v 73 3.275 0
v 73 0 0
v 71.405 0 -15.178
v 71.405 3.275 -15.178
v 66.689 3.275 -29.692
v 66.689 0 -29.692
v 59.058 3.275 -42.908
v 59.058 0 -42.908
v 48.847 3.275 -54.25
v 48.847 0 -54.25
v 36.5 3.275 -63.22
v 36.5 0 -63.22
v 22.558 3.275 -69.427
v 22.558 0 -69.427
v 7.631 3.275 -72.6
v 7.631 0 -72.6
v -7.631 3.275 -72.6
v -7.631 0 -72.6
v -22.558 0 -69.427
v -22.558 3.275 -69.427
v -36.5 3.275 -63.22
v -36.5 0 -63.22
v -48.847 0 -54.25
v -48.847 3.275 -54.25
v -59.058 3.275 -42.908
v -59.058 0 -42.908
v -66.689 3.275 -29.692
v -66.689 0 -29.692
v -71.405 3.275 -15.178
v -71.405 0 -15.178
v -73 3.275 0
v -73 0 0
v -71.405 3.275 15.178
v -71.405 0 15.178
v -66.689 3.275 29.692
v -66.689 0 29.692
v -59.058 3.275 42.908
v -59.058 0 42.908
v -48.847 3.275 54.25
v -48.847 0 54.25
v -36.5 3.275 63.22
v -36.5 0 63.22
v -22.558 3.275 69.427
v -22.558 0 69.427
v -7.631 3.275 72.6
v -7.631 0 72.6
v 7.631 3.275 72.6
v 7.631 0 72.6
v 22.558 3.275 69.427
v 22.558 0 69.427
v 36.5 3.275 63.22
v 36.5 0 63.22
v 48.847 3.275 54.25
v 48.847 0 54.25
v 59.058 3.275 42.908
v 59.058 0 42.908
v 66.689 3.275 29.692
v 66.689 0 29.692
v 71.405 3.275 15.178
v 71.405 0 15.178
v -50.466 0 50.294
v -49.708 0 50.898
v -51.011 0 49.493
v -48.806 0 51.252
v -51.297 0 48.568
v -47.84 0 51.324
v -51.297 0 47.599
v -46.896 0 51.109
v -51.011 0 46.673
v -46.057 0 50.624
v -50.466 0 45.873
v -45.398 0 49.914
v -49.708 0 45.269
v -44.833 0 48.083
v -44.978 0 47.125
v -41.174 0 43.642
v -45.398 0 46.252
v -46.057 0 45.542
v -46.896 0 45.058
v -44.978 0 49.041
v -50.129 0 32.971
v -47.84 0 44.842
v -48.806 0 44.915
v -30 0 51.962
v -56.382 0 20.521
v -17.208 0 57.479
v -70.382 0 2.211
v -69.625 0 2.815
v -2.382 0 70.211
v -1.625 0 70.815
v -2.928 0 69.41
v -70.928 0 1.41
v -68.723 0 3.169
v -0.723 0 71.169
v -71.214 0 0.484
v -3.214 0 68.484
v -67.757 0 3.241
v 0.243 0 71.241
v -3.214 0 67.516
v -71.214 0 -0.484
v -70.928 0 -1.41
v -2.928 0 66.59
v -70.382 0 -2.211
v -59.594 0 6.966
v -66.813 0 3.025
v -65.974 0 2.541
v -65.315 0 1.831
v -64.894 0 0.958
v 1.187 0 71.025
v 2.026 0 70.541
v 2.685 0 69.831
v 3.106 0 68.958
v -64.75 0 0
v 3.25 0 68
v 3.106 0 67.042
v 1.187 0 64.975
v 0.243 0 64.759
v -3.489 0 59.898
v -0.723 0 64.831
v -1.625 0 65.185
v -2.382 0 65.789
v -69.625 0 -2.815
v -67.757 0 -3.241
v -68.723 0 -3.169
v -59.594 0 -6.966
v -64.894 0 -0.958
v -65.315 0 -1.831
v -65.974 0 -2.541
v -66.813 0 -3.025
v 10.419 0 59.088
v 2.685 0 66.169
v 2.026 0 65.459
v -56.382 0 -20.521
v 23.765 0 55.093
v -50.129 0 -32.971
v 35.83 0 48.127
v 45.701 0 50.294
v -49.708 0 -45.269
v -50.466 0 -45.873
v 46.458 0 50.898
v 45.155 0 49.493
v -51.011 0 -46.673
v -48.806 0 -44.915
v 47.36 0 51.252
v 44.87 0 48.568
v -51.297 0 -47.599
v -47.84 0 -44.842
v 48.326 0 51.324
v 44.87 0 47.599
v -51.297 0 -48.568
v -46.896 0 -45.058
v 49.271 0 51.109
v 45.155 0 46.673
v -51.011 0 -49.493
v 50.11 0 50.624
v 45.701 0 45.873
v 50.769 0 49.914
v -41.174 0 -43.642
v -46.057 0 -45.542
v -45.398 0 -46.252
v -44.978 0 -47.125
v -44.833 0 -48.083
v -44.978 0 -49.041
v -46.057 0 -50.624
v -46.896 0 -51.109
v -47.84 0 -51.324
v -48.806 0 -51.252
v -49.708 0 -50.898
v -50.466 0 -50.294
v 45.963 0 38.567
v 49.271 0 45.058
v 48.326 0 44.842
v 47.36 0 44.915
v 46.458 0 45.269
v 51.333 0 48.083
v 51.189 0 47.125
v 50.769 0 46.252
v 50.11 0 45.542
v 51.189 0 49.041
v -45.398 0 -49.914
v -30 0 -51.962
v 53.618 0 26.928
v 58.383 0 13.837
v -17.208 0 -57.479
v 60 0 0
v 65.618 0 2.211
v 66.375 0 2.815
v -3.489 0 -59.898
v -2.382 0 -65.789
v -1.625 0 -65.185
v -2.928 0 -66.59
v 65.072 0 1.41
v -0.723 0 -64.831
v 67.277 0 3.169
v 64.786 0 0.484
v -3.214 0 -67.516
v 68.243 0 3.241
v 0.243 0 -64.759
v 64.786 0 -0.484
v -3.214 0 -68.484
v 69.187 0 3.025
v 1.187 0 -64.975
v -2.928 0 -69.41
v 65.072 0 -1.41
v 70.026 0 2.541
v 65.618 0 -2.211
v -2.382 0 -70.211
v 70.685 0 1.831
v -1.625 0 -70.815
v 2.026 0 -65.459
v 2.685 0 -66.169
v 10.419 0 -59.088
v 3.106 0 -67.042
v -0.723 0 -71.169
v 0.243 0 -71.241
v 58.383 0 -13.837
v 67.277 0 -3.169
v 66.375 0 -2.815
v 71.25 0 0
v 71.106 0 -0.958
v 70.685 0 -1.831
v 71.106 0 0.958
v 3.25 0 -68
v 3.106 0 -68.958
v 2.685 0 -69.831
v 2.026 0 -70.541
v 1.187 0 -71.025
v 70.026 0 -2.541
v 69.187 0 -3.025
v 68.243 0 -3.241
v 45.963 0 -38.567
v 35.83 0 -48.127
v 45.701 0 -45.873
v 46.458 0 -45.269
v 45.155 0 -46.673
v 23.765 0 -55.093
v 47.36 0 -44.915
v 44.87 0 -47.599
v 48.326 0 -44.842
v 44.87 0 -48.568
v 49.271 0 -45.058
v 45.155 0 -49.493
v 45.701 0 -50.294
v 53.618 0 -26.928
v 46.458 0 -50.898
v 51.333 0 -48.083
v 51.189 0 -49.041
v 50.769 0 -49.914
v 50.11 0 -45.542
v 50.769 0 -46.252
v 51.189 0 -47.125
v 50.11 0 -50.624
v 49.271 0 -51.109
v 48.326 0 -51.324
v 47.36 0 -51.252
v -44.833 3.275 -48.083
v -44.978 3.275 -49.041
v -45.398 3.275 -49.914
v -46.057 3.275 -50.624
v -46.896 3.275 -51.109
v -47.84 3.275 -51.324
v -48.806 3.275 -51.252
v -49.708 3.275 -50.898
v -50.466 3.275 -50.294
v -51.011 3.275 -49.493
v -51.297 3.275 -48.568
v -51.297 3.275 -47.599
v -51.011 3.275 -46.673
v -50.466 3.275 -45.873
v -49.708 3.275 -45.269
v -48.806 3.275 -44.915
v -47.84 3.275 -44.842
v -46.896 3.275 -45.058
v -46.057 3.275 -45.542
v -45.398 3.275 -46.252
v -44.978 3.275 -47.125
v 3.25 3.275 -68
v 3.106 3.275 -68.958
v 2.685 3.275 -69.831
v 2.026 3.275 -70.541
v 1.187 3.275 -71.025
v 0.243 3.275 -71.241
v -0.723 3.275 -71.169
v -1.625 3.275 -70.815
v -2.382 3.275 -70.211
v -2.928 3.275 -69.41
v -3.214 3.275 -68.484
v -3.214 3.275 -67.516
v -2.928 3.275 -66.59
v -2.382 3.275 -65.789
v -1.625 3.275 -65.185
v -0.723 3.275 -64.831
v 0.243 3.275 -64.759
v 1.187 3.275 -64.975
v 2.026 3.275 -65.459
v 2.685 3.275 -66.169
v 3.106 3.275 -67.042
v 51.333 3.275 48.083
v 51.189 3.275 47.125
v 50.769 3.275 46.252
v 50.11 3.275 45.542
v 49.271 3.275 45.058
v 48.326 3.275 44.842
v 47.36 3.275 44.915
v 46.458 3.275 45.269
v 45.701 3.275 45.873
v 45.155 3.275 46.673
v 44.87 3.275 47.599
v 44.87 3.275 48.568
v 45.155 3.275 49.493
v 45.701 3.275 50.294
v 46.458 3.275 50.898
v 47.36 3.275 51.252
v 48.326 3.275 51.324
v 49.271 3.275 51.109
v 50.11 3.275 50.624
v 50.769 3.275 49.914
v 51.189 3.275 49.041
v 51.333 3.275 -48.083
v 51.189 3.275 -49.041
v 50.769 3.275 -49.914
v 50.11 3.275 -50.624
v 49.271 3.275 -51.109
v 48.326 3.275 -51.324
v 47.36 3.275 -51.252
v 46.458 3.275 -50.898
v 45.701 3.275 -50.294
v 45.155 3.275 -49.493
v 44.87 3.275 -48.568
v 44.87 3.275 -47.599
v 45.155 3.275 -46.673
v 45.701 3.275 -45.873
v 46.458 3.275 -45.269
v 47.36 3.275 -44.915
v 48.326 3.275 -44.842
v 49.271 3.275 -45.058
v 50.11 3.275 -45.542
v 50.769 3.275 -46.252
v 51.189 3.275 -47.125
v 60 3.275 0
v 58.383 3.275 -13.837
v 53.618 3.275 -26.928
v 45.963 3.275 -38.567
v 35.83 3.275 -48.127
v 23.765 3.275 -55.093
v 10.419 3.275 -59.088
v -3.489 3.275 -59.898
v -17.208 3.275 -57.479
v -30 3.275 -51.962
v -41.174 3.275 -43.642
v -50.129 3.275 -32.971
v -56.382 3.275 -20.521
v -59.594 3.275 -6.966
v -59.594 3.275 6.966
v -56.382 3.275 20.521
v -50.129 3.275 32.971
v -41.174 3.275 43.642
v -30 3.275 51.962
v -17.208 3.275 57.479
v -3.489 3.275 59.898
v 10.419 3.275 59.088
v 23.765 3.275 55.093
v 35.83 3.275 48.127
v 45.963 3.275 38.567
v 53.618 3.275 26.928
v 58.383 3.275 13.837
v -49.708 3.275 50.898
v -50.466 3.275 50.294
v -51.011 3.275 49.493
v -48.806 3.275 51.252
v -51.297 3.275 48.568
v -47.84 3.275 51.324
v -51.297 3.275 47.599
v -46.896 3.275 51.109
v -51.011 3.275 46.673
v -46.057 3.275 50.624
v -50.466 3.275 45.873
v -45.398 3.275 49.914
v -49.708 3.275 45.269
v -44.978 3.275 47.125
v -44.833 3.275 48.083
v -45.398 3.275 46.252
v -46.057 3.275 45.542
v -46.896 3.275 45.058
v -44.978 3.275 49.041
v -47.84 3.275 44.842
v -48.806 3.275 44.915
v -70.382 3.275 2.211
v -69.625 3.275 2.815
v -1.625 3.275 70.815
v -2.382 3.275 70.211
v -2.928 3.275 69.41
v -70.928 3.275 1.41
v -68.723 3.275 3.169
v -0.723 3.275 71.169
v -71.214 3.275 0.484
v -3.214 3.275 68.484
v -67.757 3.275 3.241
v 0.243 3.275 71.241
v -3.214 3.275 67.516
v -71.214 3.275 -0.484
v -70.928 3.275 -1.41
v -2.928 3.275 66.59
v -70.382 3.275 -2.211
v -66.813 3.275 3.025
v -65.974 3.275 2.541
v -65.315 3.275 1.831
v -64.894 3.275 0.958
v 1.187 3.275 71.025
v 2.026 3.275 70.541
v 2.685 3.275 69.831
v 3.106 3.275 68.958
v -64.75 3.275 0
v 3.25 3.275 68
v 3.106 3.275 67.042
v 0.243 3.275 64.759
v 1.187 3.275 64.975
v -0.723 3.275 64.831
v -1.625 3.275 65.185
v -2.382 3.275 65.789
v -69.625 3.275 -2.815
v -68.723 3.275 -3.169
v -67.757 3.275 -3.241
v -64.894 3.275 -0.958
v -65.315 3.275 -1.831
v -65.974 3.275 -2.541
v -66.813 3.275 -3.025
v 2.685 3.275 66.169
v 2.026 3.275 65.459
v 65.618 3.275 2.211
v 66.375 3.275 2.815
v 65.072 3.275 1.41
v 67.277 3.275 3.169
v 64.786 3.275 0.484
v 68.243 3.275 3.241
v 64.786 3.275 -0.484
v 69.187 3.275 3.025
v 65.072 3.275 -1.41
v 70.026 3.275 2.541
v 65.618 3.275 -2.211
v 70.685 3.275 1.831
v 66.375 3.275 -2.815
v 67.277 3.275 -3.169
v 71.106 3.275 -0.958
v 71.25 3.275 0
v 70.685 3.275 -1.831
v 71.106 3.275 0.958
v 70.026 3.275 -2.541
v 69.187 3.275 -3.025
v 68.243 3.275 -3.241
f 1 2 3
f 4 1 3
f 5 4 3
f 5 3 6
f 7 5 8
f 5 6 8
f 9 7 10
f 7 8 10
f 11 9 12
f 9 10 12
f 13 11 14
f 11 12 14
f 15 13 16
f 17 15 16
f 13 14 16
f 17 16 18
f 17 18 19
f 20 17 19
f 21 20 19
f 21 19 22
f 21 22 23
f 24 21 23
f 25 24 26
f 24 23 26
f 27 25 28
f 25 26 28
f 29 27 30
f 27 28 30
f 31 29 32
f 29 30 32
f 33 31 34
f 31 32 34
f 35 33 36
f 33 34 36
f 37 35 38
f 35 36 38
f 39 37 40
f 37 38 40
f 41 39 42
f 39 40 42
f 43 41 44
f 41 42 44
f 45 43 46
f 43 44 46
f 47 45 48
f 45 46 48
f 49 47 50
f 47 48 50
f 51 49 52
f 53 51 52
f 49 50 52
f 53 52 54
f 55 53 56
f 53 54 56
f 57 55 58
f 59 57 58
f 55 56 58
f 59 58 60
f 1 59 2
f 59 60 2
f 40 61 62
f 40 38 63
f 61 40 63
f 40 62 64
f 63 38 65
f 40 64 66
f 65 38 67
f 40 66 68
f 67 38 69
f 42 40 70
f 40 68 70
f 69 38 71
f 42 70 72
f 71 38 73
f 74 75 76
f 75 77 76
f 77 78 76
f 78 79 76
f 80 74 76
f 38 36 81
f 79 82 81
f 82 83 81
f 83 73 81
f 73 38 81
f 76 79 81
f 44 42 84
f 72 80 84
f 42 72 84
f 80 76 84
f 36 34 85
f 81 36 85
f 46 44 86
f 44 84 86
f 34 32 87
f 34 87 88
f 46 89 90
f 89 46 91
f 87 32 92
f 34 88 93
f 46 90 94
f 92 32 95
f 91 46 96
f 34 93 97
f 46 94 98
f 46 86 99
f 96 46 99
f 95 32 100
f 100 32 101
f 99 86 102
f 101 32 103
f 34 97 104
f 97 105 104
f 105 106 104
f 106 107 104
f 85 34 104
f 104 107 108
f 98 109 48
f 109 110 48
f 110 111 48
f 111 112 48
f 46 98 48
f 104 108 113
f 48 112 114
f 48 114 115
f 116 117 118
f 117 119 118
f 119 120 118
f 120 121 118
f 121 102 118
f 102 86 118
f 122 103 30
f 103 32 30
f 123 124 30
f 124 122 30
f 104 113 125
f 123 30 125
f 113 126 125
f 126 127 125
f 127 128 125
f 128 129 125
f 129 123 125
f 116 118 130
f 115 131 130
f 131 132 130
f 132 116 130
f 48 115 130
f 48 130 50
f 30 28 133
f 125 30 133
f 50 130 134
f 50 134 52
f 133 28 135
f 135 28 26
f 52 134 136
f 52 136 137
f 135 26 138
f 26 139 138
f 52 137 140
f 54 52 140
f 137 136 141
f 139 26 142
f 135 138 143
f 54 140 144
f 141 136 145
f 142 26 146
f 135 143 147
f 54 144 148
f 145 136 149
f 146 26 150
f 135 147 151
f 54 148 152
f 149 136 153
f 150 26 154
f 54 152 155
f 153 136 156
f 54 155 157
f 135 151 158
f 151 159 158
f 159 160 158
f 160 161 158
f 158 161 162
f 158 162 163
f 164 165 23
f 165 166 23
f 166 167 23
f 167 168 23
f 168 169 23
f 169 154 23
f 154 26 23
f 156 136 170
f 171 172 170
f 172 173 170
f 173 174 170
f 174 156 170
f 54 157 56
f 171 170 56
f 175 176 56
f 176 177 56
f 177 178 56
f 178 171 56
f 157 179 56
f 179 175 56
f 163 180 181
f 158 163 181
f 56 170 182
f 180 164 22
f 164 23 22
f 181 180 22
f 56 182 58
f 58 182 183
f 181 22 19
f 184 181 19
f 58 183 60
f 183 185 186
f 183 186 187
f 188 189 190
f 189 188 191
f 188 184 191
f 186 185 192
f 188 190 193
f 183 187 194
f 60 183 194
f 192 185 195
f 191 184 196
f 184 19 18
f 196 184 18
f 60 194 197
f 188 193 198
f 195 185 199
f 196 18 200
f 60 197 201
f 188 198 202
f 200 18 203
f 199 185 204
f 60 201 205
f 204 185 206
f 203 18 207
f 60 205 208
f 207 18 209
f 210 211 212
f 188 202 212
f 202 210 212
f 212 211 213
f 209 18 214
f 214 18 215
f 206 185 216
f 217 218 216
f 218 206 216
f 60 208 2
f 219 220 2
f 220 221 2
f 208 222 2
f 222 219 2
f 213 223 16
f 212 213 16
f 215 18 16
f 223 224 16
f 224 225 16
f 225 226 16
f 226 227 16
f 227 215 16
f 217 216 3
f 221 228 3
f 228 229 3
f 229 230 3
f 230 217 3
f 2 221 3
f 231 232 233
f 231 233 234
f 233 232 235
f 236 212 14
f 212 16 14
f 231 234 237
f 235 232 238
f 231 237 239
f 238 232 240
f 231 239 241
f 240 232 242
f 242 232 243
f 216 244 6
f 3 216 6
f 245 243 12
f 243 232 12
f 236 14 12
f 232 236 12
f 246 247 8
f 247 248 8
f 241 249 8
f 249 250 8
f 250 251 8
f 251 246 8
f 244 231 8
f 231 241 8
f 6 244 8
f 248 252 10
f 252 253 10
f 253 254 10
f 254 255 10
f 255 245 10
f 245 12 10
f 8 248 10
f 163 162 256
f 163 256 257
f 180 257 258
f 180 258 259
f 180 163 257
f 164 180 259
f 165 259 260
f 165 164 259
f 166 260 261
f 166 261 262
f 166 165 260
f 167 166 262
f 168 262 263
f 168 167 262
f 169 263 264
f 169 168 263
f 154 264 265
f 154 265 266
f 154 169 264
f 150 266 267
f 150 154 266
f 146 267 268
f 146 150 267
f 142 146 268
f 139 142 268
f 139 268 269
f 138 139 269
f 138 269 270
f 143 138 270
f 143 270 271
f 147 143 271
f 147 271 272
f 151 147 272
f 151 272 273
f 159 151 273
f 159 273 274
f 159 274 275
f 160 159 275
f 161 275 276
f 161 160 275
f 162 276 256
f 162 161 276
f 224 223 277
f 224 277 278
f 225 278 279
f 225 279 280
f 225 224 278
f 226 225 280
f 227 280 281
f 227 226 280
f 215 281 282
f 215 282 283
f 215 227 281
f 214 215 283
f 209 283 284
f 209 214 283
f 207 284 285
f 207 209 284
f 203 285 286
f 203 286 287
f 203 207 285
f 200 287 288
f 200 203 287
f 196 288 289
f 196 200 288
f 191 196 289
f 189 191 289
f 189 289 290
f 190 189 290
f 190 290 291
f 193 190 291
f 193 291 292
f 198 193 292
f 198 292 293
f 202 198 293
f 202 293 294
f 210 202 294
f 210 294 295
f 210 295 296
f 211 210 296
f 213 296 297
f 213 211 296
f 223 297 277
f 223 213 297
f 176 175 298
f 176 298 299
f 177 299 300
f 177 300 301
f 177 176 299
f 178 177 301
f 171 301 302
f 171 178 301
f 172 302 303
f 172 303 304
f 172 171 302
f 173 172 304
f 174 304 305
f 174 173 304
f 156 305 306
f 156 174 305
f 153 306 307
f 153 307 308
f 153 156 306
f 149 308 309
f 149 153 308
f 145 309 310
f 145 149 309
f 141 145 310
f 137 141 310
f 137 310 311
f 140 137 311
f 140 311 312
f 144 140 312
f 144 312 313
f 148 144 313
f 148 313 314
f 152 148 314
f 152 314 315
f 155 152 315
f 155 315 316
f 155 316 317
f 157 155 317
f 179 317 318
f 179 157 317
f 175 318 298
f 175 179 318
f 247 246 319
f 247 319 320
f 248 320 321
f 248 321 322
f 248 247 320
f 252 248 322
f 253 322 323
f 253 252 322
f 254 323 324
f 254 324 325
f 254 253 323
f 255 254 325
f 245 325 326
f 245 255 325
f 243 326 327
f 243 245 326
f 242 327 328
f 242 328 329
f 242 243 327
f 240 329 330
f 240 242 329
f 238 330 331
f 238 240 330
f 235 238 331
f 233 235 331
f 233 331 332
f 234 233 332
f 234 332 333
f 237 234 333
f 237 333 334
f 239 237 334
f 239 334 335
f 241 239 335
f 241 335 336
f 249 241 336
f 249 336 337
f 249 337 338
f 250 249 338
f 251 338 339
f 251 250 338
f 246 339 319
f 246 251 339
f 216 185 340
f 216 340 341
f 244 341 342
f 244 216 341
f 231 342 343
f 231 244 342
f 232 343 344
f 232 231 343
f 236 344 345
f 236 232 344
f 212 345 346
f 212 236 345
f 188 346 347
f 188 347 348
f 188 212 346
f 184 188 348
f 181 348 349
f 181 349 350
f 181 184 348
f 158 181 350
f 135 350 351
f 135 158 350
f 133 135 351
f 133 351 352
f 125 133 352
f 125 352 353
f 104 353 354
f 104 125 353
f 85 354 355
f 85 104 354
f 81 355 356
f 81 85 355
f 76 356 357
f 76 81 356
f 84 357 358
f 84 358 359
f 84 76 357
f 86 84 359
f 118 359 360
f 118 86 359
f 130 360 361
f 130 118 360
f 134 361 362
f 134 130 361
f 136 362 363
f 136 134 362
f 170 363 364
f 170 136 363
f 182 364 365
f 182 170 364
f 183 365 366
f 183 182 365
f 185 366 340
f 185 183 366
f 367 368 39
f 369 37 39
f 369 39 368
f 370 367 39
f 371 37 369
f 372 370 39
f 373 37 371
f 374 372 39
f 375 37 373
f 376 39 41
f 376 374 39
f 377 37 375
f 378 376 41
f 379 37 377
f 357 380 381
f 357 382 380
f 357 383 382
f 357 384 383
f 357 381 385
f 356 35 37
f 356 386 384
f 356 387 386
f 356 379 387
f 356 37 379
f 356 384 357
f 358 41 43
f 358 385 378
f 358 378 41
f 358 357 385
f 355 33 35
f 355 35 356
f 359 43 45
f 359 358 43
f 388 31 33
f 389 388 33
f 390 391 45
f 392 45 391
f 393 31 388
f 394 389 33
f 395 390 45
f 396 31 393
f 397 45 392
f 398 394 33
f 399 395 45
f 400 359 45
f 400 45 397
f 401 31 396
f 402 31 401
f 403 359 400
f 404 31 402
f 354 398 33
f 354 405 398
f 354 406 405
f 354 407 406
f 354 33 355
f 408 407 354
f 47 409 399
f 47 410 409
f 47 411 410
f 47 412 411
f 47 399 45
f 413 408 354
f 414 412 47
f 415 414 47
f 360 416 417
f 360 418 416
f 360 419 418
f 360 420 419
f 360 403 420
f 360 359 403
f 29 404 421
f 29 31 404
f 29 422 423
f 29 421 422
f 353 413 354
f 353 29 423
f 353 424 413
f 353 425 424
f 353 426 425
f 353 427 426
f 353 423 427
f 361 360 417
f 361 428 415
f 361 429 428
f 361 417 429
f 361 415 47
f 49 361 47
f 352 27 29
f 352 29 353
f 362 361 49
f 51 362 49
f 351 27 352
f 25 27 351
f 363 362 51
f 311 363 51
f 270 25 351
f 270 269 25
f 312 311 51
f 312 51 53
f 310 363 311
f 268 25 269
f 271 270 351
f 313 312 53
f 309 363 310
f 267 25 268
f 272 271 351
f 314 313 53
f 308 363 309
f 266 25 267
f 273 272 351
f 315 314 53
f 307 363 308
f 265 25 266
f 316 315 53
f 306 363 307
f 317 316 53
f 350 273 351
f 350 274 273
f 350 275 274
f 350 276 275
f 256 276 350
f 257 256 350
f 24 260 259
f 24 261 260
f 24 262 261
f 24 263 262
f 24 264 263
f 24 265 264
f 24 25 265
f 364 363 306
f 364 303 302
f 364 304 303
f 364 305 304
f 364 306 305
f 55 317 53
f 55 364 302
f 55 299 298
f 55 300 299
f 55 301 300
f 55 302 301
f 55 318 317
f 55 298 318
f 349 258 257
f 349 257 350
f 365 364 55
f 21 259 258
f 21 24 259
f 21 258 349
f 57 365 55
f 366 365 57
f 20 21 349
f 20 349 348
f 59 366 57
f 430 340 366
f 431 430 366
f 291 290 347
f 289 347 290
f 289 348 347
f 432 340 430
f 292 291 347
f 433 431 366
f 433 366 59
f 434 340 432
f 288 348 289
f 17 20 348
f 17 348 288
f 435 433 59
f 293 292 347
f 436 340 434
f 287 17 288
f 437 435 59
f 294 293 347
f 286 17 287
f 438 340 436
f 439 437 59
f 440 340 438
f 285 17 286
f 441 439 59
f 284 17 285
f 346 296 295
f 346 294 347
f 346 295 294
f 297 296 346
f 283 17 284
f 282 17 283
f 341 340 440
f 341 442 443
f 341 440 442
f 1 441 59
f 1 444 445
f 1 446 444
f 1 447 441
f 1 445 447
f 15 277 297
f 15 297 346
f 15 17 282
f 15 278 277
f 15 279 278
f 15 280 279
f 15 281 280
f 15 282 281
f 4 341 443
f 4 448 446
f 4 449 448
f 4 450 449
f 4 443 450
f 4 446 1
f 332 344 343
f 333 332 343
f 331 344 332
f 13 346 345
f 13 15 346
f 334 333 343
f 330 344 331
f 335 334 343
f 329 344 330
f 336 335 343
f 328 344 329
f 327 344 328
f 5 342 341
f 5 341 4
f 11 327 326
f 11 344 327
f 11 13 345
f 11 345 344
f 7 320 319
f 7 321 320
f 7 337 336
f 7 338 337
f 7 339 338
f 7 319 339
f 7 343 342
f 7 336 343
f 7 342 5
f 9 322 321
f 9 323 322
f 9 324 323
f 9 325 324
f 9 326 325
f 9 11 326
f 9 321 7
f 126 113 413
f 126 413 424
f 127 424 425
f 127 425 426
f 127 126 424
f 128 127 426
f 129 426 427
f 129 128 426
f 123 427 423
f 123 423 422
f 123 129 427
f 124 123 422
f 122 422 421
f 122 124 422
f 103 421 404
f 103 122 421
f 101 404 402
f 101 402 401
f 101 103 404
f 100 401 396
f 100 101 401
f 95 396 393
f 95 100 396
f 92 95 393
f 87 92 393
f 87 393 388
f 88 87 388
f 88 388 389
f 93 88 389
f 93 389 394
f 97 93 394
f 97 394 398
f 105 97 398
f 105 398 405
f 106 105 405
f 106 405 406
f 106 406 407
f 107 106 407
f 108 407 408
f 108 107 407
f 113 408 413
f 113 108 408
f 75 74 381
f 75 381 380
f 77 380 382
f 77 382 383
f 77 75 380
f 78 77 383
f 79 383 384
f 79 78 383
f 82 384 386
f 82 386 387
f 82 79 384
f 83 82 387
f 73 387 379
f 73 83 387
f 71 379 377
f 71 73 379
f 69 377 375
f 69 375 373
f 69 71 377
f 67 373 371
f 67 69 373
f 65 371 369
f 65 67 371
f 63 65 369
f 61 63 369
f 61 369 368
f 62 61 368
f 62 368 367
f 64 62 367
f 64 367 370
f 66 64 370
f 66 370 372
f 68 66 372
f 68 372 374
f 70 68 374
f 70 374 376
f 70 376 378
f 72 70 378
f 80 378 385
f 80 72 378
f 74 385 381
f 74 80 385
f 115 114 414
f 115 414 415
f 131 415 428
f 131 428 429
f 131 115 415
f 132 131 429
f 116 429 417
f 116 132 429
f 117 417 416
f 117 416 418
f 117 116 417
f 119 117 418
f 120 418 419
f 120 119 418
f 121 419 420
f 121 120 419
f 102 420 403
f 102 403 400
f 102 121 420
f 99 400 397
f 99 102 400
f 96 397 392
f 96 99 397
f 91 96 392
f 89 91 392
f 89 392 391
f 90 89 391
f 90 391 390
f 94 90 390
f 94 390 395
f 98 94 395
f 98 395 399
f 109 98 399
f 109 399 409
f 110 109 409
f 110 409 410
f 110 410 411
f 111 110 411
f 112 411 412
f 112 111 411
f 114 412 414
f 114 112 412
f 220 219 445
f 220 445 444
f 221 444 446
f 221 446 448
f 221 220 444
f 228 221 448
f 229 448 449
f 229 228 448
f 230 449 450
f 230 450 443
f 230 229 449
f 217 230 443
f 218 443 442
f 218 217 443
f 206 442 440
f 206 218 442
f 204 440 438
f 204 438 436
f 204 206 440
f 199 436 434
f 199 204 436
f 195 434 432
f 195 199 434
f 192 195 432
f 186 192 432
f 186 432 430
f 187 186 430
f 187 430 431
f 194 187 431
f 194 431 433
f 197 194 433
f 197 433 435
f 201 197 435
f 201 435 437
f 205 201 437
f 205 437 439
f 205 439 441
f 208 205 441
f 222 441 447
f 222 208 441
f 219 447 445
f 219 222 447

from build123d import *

# Parameters (mm, degrees)
SKETCH1_R           = 73
SKETCH1_R_2         = 60
SKETCH1_R_3         = 3.25
BOSS_EXTRUDE1_DEPTH = 3.275


with BuildPart() as part:
    # Sketch1 → Boss-Extrude1 (new body)
    with BuildSketch(Plane(origin=(0, 0, 0), x_dir=(1, 0, 0), z_dir=(0, 1, 0))):
        Circle(SKETCH1_R)
        Circle(SKETCH1_R_2, mode=Mode.SUBTRACT)
        with Locations((-48.083261121, 48.083261121)):
            Circle(SKETCH1_R_3, mode=Mode.SUBTRACT)
        with Locations((-68, 0)):
            Circle(SKETCH1_R_3, mode=Mode.SUBTRACT)
        with Locations((0, 68)):
            Circle(SKETCH1_R_3, mode=Mode.SUBTRACT)
        with Locations((48.083261121, 48.083261121)):
            Circle(SKETCH1_R_3, mode=Mode.SUBTRACT)
        with Locations((68, 0)):
            Circle(SKETCH1_R_3, mode=Mode.SUBTRACT)
        with Locations((48.083261121, -48.083261121)):
            Circle(SKETCH1_R_3, mode=Mode.SUBTRACT)
        with Locations((0, -68)):
            Circle(SKETCH1_R_3, mode=Mode.SUBTRACT)
        with Locations((-48.083261121, -48.083261121)):
            Circle(SKETCH1_R_3, mode=Mode.SUBTRACT)
    extrude(amount=BOSS_EXTRUDE1_DEPTH)


solid = part.part
